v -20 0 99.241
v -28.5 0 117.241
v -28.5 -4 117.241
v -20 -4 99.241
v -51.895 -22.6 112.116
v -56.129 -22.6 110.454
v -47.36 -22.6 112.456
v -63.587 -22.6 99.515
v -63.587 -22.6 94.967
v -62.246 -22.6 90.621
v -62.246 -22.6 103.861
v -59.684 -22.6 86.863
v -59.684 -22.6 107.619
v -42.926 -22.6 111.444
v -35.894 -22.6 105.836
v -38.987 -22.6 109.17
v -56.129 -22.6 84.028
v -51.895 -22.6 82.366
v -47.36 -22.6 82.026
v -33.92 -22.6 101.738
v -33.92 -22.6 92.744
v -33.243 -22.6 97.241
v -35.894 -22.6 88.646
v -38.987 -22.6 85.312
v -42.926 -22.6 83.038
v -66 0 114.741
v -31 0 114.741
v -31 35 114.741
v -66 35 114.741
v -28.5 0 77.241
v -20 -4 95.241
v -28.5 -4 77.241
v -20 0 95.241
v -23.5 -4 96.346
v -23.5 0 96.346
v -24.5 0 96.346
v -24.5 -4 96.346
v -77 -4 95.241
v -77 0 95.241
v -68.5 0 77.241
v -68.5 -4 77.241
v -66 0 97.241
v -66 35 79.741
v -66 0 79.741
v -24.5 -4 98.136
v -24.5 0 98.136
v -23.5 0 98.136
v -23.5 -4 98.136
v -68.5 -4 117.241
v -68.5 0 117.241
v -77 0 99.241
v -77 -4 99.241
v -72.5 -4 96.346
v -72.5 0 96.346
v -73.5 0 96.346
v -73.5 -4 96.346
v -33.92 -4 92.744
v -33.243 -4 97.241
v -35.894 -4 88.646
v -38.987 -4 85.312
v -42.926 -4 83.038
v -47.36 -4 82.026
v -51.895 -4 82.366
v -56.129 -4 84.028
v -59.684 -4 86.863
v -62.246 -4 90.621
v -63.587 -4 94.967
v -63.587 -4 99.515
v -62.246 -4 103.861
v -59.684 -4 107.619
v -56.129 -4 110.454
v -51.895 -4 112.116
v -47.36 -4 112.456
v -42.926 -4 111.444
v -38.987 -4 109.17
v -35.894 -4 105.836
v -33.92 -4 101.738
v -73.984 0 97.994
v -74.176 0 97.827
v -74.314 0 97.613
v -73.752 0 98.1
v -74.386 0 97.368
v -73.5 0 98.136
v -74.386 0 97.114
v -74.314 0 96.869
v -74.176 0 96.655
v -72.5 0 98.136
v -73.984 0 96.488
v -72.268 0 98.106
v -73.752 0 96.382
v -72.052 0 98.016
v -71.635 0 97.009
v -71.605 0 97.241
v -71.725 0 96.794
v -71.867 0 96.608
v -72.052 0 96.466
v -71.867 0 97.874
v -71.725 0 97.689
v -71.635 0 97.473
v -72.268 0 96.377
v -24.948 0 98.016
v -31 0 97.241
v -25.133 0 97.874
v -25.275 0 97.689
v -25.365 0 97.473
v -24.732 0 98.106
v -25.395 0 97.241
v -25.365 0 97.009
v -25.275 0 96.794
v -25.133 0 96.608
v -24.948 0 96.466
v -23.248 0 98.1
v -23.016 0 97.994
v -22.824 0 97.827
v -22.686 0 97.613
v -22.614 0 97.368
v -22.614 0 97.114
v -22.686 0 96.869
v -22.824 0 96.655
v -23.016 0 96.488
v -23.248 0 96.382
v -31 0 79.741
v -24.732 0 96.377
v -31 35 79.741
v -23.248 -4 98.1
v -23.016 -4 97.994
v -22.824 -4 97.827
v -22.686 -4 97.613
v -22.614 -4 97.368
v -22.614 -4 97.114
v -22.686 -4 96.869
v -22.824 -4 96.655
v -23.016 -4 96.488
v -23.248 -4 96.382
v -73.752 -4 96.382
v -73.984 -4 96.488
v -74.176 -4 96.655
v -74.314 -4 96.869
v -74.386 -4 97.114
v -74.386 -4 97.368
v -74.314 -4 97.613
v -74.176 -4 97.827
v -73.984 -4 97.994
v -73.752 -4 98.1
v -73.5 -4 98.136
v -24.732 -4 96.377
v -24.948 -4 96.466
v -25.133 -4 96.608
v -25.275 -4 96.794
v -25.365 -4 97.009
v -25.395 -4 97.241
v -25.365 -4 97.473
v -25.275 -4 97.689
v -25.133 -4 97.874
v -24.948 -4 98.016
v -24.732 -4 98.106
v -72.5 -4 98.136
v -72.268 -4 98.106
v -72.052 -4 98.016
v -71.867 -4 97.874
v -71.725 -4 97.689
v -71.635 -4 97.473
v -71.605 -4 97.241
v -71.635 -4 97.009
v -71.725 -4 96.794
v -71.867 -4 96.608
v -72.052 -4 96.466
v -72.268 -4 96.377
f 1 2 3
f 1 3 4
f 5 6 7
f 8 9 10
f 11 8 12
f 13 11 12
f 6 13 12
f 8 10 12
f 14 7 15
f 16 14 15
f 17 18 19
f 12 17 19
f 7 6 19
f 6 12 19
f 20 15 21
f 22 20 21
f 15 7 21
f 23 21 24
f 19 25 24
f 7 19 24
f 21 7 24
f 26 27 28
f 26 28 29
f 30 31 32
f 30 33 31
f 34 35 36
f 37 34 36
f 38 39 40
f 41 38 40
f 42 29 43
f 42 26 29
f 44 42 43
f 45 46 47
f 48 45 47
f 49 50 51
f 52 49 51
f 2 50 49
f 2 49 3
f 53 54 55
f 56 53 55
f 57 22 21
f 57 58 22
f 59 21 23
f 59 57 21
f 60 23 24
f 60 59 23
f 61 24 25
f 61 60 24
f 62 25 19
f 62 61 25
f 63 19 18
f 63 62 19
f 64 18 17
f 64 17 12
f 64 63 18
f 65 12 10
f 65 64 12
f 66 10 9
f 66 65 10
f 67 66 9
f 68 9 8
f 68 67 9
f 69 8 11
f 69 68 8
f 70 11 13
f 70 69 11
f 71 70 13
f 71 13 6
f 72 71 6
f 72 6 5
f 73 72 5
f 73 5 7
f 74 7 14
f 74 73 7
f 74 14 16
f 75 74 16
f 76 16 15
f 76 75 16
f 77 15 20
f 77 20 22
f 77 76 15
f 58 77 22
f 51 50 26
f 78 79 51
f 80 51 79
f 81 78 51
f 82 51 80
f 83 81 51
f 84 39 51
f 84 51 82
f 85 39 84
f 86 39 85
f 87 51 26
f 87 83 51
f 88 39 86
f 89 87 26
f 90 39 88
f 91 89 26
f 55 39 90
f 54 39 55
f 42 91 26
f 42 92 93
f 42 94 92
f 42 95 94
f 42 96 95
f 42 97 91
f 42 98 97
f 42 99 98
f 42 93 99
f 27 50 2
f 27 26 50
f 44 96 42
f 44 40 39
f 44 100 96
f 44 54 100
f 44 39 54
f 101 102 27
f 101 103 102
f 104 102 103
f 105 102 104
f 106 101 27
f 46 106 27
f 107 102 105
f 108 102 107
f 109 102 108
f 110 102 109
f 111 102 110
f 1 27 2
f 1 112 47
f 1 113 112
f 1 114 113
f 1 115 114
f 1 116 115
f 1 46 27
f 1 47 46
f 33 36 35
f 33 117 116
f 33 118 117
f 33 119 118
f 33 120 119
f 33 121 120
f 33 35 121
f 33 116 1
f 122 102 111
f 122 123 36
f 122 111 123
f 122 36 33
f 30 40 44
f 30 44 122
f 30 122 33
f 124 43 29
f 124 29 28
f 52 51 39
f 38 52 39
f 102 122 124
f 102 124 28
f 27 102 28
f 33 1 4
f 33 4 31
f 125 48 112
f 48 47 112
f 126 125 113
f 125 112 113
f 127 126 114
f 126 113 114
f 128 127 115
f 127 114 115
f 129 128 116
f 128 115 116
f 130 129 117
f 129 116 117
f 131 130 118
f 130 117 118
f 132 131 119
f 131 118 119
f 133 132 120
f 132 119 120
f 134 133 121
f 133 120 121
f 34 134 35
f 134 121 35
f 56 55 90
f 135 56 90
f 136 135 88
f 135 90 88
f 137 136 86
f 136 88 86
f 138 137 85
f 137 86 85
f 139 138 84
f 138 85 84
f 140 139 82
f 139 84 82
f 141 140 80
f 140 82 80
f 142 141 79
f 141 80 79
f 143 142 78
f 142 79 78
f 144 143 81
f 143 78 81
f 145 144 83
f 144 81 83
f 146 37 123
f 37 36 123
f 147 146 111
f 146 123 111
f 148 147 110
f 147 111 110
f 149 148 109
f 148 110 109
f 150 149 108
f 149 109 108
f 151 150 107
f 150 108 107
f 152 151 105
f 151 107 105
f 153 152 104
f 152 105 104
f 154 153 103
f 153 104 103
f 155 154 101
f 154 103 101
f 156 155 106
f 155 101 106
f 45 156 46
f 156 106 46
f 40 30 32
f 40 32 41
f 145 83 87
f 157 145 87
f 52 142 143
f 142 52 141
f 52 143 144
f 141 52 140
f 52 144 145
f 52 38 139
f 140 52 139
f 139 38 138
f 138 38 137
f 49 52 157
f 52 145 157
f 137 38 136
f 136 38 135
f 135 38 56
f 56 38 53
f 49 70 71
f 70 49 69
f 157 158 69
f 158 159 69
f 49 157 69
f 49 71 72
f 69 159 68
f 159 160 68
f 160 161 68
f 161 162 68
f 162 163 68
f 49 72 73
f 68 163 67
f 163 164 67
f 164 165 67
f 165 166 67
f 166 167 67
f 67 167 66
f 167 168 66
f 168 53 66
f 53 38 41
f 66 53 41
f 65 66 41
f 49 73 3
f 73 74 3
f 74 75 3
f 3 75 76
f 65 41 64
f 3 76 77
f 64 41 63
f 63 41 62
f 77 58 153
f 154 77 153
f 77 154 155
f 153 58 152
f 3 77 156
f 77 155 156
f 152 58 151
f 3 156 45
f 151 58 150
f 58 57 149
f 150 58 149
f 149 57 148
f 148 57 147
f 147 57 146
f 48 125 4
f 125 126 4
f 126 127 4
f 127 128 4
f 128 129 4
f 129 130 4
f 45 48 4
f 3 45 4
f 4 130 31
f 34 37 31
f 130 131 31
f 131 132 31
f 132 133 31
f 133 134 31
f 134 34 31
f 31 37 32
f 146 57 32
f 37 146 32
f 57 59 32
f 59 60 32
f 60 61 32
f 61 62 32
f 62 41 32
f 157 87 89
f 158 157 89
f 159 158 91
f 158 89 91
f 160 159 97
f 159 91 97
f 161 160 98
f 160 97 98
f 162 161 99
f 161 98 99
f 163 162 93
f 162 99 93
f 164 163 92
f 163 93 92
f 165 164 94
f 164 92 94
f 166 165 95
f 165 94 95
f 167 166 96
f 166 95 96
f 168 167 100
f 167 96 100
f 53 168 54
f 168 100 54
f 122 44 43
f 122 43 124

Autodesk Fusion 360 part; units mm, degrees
sketch "Sketch1" plane through (0, 0, 0) normal (0, 1, 0) x (1, 0, 0)
  line L0 (-73.5, -97.2411) -> (-23.5, -97.2411)
  line L1 (-72.5, -97.2411) -> (-24.5, -97.2411) construction
  line L2 (-77, -97.2411) -> (-20, -97.2411) construction
  line L3 (-48.5, -117.2411) -> (-48.5, -77.2411)
  line L4 (-23.5, -96.3461) -> (-24.5, -96.3461)
  arc A0 (-24.5, -96.3461) -> (-24.5, -98.1361) centre (-24.5, -97.2411) ccw
  line L5 (-24.5, -98.1361) -> (-23.5, -98.1361)
  arc A1 (-23.5, -98.1361) -> (-23.5, -96.3461) centre (-23.5, -97.2411) ccw
  line L6 (-23.5, -97.2411) -> (-24.5, -97.2411) construction
  line L7 (-72.5, -96.3461) -> (-73.5, -96.3461)
  arc A2 (-73.5, -96.3461) -> (-73.5, -98.1361) centre (-73.5, -97.2411) ccw
  line L8 (-73.5, -98.1361) -> (-72.5, -98.1361)
  arc A3 (-72.5, -98.1361) -> (-72.5, -96.3461) centre (-72.5, -97.2411) ccw
  line L9 (-72.5, -97.2411) -> (-73.5, -97.2411) construction
  circle A4 centre (-48.5, -97.2411) radius 15.2574
  line L10 (-31, -114.7411) -> (-66, -114.7411)
  line L11 (-66, -114.7411) -> (-66, -79.7411)
  line L12 (-66, -79.7411) -> (-31, -79.7411)
  line L13 (-31, -79.7411) -> (-31, -114.7411)
  line L14 (-48.5, -114.7411) -> (-48.5, -79.7411) construction
  line L15 (-31, -97.2411) -> (-66, -97.2411) construction
  line L16 (-68.5, -117.2411) -> (-28.5, -117.2411)
  line L17 (-28.5, -117.2411) -> (-28.5, -77.2411) construction
  line L18 (-28.5, -77.2411) -> (-68.5, -77.2411)
  line L19 (-68.5, -77.2411) -> (-68.5, -117.2411) construction
  line L20 (-68.5, -97.2411) -> (-28.5, -97.2411) construction
  line L21 (-68.5, -117.2411) -> (-77, -99.2411)
  line L22 (-77, -99.2411) -> (-77, -97.2411)
  line L23 (-77, -97.2411) -> (-77, -95.2411)
  line L24 (-77, -95.2411) -> (-68.5, -77.2411)
  line L25 (-28.5, -117.2411) -> (-20, -99.2411)
  line L26 (-20, -99.2411) -> (-20, -97.2411)
  line L27 (-20, -97.2411) -> (-20, -95.2411)
  line L28 (-20, -95.2411) -> (-28.5, -77.2411)
  dimension "d1" = 50
  dimension "d2" = 48
  dimension "d3" = 57
  dimension "d4" = 40
  dimension "d5" = 1.79
  dimension "d6" = 1.79
  dimension "d7" = 35
  dimension "d8" = 35
  dimension "d9" = 40
  dimension "d10" = 40
  dimension "d11" = 4
extrude "Extrude1" add sketch "Sketch1" along normal blind 35 contours L0 L3 A4 L11 L12 | L0 L3 A4 L10 L11 | L0 L3 A4 | L0 L3 A4 | L0 L3 A4 | L0 L3 A4 | L0 L3 A4 L12 L13 | L0 L3 A4 L10 L13
extrude "Extrude2" add sketch "Sketch1" against normal blind 4
extrude "Extrude3" add sketch "Sketch1" against normal blind 22.6 contours L0 L3 A4 | L0 L3 A4 | L0 L3 A4 | L0 L3 A4
equation "d16 = -26.6 mm + 4 mm"
